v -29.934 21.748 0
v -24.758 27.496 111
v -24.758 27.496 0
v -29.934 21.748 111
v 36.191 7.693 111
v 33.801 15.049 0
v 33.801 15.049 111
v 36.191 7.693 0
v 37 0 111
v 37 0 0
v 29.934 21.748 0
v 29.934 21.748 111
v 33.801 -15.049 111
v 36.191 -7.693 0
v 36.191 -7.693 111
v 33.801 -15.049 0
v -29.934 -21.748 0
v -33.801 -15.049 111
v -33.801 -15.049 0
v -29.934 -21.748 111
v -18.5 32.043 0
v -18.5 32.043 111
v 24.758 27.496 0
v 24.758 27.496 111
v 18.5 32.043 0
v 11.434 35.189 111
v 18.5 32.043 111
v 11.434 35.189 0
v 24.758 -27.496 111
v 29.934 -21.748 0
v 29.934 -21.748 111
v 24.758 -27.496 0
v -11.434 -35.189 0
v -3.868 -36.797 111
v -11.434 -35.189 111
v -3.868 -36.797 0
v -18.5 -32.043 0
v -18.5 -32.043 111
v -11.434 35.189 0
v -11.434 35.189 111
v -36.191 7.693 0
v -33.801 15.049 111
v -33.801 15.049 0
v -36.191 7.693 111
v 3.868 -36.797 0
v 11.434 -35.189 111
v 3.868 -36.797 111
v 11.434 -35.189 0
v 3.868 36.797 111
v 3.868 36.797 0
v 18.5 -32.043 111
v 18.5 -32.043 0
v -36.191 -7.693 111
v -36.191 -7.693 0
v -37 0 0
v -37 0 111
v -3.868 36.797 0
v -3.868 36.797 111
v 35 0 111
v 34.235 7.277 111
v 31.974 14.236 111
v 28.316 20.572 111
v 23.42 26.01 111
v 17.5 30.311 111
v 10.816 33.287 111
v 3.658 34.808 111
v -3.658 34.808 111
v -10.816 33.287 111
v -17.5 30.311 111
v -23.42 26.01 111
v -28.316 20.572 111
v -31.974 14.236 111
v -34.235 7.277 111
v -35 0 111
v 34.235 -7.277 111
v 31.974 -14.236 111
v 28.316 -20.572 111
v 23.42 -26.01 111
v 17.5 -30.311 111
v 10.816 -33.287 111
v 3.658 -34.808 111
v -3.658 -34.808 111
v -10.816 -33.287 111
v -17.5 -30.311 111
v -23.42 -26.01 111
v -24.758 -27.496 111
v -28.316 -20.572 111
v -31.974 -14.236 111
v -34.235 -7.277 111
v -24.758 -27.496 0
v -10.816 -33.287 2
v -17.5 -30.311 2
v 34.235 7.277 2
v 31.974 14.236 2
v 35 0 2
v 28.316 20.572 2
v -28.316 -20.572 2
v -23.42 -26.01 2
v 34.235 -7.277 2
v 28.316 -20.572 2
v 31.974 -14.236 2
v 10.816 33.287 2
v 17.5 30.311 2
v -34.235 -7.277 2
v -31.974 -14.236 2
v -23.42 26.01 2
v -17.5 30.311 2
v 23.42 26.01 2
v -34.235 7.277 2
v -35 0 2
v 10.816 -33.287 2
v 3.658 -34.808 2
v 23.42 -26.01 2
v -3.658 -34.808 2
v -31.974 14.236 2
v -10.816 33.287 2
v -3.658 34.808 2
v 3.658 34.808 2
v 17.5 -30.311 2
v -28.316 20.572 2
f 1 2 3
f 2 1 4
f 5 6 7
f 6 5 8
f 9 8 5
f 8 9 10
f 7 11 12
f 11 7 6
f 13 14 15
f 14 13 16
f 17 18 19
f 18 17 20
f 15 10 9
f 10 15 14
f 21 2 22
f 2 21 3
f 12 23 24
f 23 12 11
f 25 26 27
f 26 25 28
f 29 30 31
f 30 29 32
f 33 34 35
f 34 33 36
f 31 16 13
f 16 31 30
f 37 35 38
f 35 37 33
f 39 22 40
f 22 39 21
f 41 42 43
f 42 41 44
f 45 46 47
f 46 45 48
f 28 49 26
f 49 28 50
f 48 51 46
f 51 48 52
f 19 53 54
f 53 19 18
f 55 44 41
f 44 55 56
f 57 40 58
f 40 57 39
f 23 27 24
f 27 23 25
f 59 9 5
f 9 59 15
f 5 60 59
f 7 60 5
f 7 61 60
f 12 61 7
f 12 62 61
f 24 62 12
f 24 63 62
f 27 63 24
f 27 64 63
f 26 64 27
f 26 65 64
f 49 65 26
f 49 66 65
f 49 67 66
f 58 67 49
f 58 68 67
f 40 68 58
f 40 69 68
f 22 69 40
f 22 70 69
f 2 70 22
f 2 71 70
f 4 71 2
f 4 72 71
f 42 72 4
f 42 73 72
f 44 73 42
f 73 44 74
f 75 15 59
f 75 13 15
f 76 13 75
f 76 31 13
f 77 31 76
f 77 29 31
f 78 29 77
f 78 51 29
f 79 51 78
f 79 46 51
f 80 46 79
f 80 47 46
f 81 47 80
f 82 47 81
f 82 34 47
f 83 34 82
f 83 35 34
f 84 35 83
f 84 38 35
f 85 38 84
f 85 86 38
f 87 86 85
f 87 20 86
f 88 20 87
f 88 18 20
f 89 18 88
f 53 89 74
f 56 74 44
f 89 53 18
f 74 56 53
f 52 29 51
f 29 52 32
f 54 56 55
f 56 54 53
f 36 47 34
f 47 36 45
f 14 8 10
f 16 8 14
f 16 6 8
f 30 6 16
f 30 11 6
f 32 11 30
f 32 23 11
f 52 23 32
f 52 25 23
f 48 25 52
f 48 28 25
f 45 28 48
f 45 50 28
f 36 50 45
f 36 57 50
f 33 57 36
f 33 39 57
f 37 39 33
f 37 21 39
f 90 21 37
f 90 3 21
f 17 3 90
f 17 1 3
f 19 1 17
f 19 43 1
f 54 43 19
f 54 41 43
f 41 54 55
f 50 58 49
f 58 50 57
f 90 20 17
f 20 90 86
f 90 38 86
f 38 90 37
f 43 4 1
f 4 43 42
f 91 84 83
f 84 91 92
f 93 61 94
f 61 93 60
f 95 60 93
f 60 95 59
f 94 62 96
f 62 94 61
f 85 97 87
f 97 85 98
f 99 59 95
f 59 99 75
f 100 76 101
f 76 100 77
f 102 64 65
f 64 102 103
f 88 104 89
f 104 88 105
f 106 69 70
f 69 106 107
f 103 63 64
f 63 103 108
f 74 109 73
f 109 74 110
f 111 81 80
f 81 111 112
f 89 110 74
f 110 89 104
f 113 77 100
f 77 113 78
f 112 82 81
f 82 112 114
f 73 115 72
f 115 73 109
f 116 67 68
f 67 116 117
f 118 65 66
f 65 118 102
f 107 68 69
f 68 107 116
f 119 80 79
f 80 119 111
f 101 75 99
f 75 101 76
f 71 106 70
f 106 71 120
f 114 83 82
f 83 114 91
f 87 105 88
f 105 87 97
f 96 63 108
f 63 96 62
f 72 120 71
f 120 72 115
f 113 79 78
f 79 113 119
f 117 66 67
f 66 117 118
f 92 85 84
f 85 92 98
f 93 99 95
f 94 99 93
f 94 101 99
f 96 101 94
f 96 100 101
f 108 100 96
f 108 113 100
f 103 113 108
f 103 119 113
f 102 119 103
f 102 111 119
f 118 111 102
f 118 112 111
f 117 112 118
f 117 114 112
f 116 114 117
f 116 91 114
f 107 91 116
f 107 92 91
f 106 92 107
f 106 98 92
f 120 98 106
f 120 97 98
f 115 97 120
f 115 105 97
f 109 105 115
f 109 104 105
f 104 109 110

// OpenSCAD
diameter = 74;
depth = 111;
wallThickness = 2;

difference() {
    translate([0,0,depth/2])
        cylinder(h = depth, d = diameter, center = true);
    translate([0,0,depth/2+wallThickness])
        cylinder(h = depth, d = diameter - 2 * wallThickness,
        center = true);
}
